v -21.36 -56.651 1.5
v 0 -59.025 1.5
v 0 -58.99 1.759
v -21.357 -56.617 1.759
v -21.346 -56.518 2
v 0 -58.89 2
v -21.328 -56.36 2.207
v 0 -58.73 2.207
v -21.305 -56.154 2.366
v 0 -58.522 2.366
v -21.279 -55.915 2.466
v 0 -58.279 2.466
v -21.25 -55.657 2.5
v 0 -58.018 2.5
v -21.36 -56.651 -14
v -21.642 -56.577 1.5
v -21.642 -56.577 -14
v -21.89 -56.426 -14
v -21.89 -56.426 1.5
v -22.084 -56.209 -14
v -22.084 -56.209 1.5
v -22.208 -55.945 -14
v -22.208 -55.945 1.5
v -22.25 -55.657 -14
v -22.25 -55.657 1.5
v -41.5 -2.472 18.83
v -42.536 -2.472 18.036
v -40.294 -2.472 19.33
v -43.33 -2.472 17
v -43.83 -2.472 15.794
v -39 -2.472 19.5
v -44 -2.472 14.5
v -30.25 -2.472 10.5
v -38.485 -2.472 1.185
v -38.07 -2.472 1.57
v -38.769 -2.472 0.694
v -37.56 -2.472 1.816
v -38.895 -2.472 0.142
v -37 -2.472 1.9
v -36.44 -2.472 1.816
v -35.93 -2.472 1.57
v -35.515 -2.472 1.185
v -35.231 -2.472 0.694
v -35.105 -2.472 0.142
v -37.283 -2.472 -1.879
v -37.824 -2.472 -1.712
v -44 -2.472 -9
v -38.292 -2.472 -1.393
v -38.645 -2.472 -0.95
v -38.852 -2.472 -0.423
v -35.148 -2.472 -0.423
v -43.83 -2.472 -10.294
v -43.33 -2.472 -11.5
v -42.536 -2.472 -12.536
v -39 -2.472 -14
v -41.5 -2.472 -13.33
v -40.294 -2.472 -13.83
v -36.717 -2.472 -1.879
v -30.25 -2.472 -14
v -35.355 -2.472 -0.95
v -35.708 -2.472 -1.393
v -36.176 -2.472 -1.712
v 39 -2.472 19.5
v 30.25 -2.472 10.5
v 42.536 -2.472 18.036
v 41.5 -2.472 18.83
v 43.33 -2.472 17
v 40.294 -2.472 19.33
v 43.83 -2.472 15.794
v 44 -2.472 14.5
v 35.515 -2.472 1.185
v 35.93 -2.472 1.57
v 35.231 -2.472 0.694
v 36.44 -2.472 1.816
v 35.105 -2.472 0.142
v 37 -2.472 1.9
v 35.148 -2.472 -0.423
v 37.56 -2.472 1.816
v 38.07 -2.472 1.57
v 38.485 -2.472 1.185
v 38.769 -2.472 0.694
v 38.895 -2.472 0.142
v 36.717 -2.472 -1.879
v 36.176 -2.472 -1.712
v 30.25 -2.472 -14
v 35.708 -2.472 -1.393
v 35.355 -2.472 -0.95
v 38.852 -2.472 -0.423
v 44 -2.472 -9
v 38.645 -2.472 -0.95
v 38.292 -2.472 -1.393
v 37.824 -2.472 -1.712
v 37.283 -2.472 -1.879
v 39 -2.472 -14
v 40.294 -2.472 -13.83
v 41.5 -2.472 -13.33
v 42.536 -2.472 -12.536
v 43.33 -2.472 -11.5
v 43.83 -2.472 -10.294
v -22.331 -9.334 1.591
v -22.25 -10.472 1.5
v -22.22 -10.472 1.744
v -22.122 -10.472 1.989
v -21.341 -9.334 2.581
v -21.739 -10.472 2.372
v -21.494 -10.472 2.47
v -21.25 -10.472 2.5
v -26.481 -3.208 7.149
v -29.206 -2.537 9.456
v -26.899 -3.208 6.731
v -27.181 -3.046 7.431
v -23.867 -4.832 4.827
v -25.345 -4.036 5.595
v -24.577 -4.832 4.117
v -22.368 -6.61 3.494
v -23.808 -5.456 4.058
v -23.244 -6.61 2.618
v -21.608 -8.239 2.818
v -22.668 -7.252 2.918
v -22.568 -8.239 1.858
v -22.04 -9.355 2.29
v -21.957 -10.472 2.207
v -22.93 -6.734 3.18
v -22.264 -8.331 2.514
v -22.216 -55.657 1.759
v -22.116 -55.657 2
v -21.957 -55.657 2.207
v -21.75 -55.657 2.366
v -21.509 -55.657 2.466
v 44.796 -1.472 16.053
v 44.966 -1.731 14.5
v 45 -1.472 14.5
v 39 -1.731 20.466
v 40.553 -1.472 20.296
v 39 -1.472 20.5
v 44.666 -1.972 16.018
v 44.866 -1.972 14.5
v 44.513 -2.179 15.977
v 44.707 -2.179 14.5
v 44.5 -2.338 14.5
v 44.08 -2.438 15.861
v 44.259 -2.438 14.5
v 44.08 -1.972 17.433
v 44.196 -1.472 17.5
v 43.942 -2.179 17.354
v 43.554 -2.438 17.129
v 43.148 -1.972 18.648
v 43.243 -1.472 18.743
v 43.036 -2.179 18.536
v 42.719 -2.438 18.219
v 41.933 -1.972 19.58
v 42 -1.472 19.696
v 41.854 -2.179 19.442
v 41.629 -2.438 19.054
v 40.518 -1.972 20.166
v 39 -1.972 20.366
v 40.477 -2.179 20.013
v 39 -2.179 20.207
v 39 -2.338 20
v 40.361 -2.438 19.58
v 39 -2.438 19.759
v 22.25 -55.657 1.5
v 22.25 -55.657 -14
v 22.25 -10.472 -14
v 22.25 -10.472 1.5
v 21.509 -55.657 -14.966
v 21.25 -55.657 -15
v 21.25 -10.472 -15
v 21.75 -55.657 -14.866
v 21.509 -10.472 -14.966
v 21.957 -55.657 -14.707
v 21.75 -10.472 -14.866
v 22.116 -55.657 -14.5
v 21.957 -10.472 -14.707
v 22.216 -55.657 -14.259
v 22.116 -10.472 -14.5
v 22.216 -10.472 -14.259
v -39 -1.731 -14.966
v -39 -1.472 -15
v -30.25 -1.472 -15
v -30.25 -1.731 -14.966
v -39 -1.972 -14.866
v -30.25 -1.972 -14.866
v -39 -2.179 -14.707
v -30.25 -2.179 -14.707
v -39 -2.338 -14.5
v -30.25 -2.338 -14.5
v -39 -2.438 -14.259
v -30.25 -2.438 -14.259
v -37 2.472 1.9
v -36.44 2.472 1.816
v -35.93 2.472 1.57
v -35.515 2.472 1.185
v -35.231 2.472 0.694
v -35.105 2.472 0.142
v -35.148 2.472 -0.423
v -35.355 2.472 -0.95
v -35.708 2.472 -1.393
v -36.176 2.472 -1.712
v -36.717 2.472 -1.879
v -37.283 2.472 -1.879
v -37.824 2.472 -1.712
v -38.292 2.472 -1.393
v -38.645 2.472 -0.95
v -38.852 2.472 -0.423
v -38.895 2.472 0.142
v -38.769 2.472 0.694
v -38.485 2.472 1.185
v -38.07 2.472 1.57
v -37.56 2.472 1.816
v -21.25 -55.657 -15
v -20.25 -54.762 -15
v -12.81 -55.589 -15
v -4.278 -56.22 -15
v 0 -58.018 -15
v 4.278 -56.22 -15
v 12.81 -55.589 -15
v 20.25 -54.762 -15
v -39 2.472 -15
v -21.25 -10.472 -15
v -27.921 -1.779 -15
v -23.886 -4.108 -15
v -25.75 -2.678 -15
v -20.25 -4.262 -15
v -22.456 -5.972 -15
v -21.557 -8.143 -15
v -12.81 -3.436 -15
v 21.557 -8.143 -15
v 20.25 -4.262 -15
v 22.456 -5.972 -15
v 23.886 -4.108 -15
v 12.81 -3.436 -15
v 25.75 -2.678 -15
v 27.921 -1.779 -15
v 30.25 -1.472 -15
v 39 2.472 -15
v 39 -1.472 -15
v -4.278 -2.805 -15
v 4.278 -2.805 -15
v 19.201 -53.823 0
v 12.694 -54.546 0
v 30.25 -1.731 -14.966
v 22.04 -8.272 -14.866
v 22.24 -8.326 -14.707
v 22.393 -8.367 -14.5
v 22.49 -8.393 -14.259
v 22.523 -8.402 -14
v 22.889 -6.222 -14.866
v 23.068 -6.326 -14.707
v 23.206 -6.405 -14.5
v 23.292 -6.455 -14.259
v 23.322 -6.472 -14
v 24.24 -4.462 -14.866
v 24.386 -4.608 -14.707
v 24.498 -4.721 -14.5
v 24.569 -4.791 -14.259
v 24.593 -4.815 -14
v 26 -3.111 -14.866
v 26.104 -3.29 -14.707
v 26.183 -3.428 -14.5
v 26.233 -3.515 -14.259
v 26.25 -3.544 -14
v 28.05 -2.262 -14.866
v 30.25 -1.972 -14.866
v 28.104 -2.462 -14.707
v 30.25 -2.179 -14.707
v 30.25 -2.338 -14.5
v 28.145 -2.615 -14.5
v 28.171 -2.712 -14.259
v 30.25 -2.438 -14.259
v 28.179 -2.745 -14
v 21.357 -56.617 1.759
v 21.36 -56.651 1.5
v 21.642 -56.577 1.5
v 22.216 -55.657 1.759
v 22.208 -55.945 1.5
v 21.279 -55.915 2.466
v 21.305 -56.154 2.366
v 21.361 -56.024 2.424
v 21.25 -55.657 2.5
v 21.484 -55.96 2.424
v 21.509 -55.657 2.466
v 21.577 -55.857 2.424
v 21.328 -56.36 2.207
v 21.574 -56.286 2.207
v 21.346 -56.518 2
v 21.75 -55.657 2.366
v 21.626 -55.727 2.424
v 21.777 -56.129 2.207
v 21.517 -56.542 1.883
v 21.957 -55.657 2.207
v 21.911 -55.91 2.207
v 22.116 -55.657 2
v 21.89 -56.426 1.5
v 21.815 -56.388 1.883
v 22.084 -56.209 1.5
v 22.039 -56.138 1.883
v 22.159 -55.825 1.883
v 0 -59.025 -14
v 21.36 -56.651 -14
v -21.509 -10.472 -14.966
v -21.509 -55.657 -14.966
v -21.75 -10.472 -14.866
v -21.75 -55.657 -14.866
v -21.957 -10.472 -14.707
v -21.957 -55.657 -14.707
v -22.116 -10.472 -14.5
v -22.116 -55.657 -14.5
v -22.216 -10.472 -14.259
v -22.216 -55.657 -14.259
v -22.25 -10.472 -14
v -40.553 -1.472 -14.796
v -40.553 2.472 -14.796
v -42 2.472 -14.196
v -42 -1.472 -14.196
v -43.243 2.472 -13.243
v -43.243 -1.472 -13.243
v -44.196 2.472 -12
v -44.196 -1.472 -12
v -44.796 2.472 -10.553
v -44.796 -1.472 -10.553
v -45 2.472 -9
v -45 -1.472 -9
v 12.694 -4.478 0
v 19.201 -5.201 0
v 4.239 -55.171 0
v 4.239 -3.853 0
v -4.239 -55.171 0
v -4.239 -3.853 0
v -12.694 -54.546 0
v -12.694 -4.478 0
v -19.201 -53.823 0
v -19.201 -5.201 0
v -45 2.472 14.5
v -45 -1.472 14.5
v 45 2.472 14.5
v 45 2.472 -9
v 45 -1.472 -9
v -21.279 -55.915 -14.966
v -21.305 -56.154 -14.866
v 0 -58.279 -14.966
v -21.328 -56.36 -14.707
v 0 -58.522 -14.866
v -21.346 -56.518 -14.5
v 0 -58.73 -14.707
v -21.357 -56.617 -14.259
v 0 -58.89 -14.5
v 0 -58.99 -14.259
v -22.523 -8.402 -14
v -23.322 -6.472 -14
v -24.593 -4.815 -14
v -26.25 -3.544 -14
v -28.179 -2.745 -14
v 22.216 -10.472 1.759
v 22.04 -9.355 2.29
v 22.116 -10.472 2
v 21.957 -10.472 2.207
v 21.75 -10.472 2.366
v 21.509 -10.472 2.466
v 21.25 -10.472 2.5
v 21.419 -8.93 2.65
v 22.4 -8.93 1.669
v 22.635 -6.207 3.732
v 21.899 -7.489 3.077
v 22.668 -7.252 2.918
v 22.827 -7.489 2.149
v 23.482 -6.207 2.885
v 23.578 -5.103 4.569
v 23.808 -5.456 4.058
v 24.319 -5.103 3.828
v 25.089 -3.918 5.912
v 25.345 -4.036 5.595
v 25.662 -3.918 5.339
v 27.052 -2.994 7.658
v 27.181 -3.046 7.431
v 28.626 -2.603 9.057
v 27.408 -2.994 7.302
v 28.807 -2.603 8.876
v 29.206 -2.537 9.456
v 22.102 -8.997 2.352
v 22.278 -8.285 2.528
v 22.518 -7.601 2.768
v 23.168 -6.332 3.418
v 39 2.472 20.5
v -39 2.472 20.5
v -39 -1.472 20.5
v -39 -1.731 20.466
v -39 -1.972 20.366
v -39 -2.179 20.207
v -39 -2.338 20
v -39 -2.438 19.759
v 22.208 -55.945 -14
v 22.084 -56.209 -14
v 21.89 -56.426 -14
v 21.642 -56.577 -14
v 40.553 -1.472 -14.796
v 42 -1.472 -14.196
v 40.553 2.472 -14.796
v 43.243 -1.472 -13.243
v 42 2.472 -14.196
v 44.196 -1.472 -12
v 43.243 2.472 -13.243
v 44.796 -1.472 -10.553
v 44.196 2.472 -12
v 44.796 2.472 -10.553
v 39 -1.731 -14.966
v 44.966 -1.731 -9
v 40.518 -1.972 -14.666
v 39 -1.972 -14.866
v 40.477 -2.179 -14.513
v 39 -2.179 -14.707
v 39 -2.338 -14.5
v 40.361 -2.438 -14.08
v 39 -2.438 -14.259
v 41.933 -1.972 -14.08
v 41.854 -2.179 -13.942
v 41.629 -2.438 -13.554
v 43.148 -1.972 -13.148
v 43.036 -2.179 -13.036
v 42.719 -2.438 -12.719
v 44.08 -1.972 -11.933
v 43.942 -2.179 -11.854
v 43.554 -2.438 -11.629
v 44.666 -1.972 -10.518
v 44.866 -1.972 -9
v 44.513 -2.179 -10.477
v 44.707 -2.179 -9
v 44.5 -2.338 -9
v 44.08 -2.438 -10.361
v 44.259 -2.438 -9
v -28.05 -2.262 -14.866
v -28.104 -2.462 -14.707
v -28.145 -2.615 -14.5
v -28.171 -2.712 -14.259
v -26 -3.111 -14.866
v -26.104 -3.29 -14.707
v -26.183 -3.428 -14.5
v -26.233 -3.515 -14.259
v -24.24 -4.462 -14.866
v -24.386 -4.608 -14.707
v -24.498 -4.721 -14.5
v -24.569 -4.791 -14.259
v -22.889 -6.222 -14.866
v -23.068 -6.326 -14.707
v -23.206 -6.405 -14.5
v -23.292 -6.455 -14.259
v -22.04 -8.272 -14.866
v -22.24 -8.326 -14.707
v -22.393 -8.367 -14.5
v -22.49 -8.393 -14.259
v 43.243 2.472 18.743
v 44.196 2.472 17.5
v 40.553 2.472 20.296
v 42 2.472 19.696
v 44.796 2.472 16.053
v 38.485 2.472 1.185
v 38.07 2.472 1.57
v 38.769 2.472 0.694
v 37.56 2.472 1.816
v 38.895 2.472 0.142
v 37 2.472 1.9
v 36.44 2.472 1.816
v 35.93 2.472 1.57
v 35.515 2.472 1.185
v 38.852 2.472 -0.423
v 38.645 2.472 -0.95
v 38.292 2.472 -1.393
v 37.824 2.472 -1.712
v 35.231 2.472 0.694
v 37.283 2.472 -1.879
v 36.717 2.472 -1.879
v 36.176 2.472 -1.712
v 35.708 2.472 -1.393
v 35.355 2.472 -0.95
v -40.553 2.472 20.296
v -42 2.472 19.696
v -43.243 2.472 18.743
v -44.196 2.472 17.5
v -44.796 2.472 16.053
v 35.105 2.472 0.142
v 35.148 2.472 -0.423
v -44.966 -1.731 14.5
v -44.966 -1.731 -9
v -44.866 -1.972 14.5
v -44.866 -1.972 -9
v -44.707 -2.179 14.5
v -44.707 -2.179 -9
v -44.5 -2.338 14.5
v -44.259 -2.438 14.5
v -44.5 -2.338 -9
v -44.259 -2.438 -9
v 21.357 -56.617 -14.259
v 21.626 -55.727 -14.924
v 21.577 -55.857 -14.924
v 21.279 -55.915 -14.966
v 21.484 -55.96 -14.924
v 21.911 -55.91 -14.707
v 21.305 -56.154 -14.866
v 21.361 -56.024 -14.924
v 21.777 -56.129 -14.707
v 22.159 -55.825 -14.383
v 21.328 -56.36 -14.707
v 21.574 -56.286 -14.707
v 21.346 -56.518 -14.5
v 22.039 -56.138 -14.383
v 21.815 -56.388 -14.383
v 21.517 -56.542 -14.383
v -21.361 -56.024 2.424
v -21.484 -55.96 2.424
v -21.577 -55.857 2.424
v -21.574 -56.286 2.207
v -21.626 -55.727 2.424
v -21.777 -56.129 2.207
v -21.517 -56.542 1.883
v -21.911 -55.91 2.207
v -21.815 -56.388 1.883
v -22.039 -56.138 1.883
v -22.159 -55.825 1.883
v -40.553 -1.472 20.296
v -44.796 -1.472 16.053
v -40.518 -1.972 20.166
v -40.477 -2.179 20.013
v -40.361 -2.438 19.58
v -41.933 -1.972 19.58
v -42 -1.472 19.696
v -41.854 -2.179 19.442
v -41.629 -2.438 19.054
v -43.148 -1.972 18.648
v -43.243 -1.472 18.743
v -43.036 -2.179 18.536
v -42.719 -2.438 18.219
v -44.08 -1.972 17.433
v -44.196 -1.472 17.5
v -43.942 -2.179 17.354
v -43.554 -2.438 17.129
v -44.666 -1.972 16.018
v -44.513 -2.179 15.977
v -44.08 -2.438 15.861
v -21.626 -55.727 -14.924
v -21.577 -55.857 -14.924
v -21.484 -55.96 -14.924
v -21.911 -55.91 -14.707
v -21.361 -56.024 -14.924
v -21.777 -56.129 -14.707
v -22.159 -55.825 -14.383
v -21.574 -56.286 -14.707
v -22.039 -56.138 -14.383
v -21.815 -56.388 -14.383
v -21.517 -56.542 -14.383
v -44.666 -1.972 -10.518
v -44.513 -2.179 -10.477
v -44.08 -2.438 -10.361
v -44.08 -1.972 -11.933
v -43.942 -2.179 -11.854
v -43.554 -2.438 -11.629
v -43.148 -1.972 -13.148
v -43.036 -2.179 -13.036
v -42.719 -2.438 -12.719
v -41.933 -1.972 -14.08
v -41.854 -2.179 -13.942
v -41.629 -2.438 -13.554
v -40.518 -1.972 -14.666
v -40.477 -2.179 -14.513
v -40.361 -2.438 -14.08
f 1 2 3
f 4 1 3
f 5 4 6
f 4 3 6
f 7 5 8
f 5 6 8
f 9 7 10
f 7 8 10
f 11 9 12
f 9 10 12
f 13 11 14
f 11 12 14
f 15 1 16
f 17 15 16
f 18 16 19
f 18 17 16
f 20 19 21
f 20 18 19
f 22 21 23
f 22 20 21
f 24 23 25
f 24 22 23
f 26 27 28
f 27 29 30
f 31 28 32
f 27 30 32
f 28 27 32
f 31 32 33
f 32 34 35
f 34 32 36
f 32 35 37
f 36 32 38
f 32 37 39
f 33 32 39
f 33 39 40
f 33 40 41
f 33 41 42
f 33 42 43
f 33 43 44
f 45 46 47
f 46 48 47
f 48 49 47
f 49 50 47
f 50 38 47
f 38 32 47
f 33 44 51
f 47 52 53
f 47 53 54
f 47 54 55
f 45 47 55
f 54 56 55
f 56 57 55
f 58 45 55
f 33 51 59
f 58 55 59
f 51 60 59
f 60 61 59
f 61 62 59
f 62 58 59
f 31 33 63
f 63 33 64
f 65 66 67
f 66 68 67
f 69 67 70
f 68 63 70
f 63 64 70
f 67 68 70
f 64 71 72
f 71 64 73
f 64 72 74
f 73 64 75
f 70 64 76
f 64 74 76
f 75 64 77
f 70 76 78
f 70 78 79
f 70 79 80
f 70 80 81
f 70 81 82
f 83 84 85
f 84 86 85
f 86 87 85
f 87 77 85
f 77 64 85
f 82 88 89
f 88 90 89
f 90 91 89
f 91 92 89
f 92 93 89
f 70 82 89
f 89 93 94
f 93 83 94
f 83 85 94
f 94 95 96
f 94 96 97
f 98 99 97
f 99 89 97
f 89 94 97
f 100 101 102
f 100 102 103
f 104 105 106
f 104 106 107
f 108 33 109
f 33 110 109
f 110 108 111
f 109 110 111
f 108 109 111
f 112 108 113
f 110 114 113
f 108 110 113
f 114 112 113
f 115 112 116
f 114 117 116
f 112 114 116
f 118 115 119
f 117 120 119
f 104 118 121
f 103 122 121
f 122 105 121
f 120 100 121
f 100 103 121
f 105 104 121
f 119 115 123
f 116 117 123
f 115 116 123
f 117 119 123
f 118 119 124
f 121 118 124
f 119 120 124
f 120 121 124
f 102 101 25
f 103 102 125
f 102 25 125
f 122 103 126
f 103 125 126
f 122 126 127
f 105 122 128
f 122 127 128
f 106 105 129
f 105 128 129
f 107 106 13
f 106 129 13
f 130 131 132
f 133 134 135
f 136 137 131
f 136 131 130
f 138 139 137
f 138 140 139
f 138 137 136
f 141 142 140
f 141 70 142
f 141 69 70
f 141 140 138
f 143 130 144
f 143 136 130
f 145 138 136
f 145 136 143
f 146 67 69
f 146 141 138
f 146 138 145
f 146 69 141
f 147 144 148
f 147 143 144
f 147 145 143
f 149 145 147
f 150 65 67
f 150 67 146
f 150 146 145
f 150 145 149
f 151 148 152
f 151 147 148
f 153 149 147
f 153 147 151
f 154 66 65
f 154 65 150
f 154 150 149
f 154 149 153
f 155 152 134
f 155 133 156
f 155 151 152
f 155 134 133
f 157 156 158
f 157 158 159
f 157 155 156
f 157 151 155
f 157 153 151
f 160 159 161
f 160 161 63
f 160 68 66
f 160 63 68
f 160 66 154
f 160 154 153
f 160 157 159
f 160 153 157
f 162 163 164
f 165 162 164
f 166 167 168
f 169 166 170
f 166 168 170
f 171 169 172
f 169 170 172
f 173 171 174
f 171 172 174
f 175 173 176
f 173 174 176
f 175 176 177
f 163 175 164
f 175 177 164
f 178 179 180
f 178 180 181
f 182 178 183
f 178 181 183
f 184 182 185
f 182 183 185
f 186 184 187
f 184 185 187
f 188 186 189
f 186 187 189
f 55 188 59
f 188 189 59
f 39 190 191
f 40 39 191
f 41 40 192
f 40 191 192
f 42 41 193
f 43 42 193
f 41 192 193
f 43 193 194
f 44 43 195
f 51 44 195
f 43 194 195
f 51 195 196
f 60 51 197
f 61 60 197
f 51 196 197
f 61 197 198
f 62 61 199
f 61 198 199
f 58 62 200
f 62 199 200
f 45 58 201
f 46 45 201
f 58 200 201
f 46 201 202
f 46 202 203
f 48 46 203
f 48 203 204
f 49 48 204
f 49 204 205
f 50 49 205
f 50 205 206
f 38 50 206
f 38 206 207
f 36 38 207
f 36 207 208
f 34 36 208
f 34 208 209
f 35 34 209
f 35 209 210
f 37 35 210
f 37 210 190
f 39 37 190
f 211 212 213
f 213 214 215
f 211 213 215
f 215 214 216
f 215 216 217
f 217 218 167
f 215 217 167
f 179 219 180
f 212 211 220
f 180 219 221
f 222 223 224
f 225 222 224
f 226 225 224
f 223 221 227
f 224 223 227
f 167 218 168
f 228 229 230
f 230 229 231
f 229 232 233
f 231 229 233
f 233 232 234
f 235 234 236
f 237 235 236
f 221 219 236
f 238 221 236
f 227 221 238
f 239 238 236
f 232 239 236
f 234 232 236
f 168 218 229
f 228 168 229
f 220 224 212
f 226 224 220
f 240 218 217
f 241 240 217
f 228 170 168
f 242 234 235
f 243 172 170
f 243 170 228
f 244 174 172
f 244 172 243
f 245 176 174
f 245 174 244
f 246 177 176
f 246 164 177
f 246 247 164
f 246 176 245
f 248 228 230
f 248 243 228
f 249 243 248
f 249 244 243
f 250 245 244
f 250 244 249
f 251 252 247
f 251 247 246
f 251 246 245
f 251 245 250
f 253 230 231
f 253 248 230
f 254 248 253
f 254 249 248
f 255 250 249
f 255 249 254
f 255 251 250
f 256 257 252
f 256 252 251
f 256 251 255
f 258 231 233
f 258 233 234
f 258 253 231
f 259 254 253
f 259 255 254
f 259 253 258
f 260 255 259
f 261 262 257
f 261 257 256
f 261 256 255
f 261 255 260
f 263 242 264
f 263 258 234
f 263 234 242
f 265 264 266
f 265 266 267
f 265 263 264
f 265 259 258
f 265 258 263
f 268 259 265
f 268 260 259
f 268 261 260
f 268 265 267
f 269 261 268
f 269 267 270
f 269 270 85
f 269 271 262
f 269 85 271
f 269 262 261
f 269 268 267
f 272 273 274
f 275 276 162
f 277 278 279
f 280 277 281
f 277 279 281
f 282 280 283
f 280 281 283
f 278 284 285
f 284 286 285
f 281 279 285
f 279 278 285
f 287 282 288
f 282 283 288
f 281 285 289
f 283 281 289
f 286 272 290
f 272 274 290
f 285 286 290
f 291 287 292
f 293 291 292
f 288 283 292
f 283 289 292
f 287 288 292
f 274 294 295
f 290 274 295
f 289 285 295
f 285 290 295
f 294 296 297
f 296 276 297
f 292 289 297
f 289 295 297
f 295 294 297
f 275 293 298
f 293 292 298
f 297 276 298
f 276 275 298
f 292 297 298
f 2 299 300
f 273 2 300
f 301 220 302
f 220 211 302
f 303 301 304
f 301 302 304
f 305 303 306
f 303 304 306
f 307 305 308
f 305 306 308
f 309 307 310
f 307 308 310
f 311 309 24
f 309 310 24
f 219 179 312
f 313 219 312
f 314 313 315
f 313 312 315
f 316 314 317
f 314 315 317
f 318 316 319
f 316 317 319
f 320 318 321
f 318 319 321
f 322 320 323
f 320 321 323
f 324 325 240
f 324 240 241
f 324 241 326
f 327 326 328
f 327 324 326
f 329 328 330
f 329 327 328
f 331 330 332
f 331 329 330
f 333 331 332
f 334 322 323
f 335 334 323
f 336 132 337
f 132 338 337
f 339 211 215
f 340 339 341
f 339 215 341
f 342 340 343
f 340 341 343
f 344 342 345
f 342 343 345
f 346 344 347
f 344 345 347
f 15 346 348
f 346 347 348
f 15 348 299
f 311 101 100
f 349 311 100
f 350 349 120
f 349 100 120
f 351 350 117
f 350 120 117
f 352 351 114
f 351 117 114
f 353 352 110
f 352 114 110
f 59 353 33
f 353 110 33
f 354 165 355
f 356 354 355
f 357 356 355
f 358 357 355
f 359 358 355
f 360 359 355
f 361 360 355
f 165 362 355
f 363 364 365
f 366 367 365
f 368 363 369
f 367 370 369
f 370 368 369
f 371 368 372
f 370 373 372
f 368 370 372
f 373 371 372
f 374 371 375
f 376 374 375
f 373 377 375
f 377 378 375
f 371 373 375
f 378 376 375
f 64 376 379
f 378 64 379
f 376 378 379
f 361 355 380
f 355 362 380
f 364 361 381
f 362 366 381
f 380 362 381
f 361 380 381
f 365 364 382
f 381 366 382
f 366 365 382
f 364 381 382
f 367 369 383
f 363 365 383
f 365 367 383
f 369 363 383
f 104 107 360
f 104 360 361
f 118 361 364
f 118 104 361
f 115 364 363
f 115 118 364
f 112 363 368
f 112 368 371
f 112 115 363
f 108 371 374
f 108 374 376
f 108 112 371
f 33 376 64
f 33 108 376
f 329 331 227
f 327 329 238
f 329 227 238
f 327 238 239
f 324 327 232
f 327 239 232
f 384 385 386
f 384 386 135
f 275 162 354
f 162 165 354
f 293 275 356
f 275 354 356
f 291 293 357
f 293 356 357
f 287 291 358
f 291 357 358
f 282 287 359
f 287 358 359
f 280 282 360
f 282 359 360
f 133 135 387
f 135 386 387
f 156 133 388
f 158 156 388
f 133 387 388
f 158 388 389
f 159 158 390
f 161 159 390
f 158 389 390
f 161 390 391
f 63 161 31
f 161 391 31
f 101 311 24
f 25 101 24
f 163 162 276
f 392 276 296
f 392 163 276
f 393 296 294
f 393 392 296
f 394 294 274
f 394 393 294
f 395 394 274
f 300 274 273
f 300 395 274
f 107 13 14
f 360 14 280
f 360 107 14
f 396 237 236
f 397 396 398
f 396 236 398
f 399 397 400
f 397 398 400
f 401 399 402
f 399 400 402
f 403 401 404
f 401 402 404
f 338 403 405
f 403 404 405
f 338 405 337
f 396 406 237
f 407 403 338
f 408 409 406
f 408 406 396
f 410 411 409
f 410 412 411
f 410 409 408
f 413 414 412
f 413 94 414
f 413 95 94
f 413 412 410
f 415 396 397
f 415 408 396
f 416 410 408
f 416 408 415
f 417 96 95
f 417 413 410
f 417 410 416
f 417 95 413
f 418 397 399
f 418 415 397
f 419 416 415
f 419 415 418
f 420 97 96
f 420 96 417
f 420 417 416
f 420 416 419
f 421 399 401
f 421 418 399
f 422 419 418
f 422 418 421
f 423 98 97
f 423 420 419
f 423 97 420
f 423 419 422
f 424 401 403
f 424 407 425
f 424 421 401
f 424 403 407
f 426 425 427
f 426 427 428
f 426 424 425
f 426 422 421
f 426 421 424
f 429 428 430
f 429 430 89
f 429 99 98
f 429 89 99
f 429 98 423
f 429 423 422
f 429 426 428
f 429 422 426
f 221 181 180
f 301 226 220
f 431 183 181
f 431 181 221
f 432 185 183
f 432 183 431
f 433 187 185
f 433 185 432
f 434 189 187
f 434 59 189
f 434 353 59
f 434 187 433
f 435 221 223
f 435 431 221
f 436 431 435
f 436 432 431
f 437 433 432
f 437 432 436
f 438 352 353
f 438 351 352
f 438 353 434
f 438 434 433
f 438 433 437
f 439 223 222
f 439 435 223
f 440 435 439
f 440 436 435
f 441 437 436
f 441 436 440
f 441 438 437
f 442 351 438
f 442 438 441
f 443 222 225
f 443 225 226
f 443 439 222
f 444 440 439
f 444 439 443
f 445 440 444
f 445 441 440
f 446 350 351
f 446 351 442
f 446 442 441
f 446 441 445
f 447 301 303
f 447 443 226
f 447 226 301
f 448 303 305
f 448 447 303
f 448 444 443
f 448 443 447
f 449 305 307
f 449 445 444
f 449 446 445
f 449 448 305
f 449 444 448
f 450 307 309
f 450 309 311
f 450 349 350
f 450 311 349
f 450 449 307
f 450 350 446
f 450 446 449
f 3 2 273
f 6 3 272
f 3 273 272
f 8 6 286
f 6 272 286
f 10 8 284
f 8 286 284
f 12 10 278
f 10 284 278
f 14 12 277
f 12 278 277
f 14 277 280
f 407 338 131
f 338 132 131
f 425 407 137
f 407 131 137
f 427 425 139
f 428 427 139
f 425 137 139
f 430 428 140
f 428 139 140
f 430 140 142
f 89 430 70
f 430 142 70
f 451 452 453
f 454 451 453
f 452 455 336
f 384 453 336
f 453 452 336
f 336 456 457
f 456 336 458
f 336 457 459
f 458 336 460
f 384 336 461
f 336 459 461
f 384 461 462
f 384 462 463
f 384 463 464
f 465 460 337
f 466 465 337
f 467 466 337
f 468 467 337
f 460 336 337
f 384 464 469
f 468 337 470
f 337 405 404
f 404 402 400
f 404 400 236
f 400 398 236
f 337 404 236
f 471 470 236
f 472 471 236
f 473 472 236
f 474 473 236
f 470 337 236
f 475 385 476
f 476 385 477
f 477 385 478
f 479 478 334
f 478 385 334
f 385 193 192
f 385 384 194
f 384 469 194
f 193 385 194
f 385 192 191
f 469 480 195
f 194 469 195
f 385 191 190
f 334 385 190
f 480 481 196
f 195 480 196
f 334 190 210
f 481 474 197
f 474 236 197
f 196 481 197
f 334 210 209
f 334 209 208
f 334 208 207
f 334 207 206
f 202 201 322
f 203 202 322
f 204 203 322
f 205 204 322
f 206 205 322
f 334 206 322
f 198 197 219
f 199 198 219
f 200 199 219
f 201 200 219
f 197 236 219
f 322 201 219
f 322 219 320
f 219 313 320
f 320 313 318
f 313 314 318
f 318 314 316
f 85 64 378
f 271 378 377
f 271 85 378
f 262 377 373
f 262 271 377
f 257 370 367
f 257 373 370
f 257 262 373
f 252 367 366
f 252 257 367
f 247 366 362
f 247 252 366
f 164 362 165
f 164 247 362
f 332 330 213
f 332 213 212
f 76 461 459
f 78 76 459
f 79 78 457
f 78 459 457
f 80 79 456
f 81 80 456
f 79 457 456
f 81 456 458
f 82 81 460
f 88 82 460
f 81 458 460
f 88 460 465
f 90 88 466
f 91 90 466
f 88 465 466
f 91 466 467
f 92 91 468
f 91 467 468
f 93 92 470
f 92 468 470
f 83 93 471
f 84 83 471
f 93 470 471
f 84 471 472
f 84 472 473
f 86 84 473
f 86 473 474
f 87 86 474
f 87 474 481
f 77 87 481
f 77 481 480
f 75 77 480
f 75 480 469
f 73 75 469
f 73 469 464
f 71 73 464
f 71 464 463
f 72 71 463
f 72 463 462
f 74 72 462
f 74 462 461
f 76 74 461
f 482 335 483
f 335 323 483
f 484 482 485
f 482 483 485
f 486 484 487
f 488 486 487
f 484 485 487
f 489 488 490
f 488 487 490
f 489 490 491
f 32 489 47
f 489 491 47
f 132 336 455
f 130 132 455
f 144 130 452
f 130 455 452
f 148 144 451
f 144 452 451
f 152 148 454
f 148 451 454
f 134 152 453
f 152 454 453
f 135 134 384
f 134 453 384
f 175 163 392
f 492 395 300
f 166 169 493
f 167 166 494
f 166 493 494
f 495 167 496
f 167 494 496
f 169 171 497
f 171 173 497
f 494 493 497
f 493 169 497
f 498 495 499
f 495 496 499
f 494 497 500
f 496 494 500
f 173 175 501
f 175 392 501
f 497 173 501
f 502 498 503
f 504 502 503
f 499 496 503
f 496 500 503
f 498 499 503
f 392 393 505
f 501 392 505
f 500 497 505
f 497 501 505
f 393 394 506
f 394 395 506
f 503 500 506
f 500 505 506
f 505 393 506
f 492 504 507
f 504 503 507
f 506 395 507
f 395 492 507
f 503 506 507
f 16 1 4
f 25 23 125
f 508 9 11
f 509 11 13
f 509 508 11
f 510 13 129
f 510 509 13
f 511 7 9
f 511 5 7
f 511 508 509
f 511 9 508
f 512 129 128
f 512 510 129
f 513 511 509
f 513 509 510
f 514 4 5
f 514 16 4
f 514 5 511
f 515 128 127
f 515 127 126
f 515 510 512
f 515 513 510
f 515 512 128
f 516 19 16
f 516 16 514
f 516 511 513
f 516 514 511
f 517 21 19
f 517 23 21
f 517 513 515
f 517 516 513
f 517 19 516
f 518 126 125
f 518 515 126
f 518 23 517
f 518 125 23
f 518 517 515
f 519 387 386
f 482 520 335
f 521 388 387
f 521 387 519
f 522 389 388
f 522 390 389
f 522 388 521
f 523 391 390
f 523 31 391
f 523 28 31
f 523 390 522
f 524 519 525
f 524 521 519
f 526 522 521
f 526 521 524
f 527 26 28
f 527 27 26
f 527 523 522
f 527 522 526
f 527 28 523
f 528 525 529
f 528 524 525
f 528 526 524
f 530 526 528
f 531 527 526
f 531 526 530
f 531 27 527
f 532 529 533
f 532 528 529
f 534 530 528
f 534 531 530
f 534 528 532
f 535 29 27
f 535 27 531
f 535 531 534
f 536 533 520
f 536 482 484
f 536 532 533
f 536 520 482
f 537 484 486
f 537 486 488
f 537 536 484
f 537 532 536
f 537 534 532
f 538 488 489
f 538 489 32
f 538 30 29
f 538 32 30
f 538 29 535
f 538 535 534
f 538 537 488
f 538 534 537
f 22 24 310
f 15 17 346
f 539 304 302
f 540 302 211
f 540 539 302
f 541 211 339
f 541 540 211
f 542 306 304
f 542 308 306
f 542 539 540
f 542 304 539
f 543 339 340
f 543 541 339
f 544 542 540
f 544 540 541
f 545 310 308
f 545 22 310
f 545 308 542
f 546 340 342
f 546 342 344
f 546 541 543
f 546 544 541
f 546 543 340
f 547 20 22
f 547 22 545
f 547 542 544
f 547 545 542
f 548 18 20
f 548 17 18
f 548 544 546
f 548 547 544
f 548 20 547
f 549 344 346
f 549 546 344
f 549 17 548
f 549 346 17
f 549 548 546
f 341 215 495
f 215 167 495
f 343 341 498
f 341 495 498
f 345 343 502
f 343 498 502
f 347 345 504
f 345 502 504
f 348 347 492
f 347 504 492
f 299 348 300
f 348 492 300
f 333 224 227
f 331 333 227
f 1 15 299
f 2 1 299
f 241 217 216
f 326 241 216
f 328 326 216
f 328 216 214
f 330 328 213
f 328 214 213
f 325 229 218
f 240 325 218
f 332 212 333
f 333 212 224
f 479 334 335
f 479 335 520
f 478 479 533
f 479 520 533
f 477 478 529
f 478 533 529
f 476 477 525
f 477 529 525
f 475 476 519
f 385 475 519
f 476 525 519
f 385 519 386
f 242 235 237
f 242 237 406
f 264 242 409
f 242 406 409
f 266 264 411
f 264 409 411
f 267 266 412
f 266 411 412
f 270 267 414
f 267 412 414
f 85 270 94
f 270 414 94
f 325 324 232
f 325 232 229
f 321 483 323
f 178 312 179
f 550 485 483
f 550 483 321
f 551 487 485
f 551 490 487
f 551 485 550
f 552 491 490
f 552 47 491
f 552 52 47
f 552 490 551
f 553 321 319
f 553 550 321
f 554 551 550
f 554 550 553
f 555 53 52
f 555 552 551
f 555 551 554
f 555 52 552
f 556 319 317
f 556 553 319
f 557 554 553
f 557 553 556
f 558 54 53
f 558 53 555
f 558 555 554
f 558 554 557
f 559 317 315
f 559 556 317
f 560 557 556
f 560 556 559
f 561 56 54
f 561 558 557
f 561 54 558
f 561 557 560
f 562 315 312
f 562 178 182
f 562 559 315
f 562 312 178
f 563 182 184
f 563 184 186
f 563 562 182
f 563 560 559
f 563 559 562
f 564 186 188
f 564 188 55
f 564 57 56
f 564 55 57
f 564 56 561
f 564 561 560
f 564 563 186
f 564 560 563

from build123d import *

# Parameters (mm, degrees)
AUFSATZ_LINEAR_AUSTRAGEN1_DEPTH  = 15
SCHNITT_LINEAR_AUSTRAGEN5_DEPTH  = 20.5
SCHNITT_LINEAR_AUSTRAGEN5_DRAFT  = -4
AUFSATZ_LINEAR_AUSTRAGEN4_DEPTH  = 2.5
SKIZZE1_7_W                      = 90
SKIZZE1_7_H                      = 4.944444444
AUFSATZ_LINEAR_AUSTRAGEN5_DEPTH  = 20.5
VERRUNDUNG1_R                    = 8
VERRUNDUNG2_R                    = 6
VERRUNDUNG3_R                    = 1
F_3_8_3_8_DURCHMESSER_BOHRUNG1_D = 3.8


with BuildPart() as part:
    # Skizze1 → Aufsatz-Linear austragen1 (new body)
    with BuildSketch(Plane.XY):
        Polygon((22.25, -56.552393395), (22.25, -2.472222222), (45, -2.472222222), (45, 2.472222222), (-45, 2.472222222), (-45, -2.472222222), (-22.25, -2.472222222), (-22.25, -56.552393395), (0, -59.024615617), align=None)
    extrude(amount=-AUFSATZ_LINEAR_AUSTRAGEN1_DEPTH)


with BuildPart() as schnitt_linear_austragen5_tool:
    # Skizze4 → Schnitt-Linear austragen5 (with draft: the straight prism first)
    with BuildSketch(Plane(origin=(0, 0, -15), x_dir=(-1, 0, 0), z_dir=(0, 0, -1))):
        with BuildLine():
            ThreePointArc((12.810057025, -3.435647478), (0, -2.7261607), (-12.810057025, -3.435647478))
            Line((-12.810057025, -3.435647478), (-20.25, -4.262307808))
            Line((-20.25, -4.262307808), (-20.25, -54.762307808))
            Line((-20.25, -54.762307808), (-12.810057025, -55.588968139))
            ThreePointArc((-12.810057025, -55.588968139), (0, -56.298454917), (12.810057025, -55.588968139))
            Line((12.810057025, -55.588968139), (20.25, -54.762307808))
            Line((20.25, -54.762307808), (20.25, -4.262307808))
            Line((20.25, -4.262307808), (12.810057025, -3.435647478))
        make_face()
    extrude(amount=-SCHNITT_LINEAR_AUSTRAGEN5_DEPTH)
    # Schnitt-Linear austragen5: the draft: its side faces are tilted about the plane it starts from
    schnitt_linear_austragen5_sides = [schnitt_linear_austragen5_tool.faces().sort_by_distance(p)[0] for p in [
        (0, -2.7261607, -4.75),
        (16.530028512, -3.848977643, -4.75),
        (20.25, -29.512307808, -4.75),
        (16.530028512, -55.175637974, -4.75),
        (0, -56.298454917, -4.75),
        (-16.530028512, -55.175637974, -4.75),
        (-20.25, -29.512307808, -4.75),
        (-16.530028512, -3.848977643, -4.75),
    ]]
    draft(schnitt_linear_austragen5_sides, Plane(origin=(0, 0, -15), x_dir=(-1, 0, 0), z_dir=(0, 0, -1)), SCHNITT_LINEAR_AUSTRAGEN5_DRAFT)


with BuildPart() as part_1:
    add(part.part)

    # Schnitt-Linear austragen5: cut by schnitt_linear_austragen5_tool
    add(schnitt_linear_austragen5_tool.part, mode=Mode.SUBTRACT)

    # Skizze1<6> → Aufsatz-Linear austragen4 (add)
    with BuildSketch(Plane.XY):
        Polygon((22.25, -56.552393395), (22.25, -2.472222222), (45, -2.472222222), (45, 2.472222222), (-45, 2.472222222), (-45, -2.472222222), (-22.25, -2.472222222), (-22.25, -56.552393395), (0, -59.024615617), align=None)
    extrude(amount=AUFSATZ_LINEAR_AUSTRAGEN4_DEPTH)

    # Skizze1<7> → Aufsatz-Linear austragen5 (add)
    with BuildSketch(Plane.XY):
        Rectangle(SKIZZE1_7_W, SKIZZE1_7_H)
    extrude(amount=AUFSATZ_LINEAR_AUSTRAGEN5_DEPTH)

    # Verrundung1
    verrundung1_edges = [part_1.edges().sort_by_distance(p)[0] for p in [
        (22.25, -2.472222222, -6.25),
        (0, -2.472222222, 2.5),
        (-22.25, -2.472222222, -6.25),
    ]]
    fillet(verrundung1_edges, radius=VERRUNDUNG1_R)

    # Verrundung2
    verrundung2_edges = [part_1.edges().sort_by_distance(p)[0] for p in [
        (45, 0, -15),
        (-45, 0, -15),
        (45, 0, 20.5),
        (-45, 0, 20.5),
    ]]
    fillet(verrundung2_edges, radius=VERRUNDUNG2_R)

    # Verrundung3
    verrundung3_edges = [part_1.edges().sort_by_distance(p)[0] for p in [
        (-25.081608741, -4.365854088, 5.331608741),
        (25.081608741, -4.365854088, 5.331608741),
        (-22.25, -33.512307808, -15),
        (-24.593145751, -4.815367973, -15),
        (-34.625, -2.472222222, -15),
        (-43.242640687, -2.472222222, -13.242640687),
        (-45, -2.472222222, 2.75),
        (-43.242640687, -2.472222222, 18.742640687),
        (22.25, -33.512307808, -15),
        (24.593145751, -4.815367973, -15),
        (34.625, -2.472222222, -15),
        (43.242640687, -2.472222222, -13.242640687),
        (45, -2.472222222, 2.75),
        (43.242640687, -2.472222222, 18.742640687),
        (11.125, -57.788504506, 2.5),
        (-11.125, -57.788504506, 2.5),
        (-22.25, -33.512307808, 2.5),
        (22.25, -33.512307808, 2.5),
        (11.125, -57.788504506, -15),
        (-11.125, -57.788504506, -15),
        (0, -2.472222222, 20.5),
        (22.25, -56.552393395, -6.25),
        (-22.25, -56.552393395, -6.25),
    ]]
    fillet(verrundung3_edges, radius=VERRUNDUNG3_R)

    # Ø3.8 (3.8) Durchmesser Bohrung1 (through all)
    with Locations(Plane(origin=(-37, -2.472222222, 0), x_dir=(0, 0, -1), z_dir=(0, -1, 0))):
        with Locations((0, 0), (0, 74)):
            Hole(F_3_8_3_8_DURCHMESSER_BOHRUNG1_D / 2)


solid = part_1.part
